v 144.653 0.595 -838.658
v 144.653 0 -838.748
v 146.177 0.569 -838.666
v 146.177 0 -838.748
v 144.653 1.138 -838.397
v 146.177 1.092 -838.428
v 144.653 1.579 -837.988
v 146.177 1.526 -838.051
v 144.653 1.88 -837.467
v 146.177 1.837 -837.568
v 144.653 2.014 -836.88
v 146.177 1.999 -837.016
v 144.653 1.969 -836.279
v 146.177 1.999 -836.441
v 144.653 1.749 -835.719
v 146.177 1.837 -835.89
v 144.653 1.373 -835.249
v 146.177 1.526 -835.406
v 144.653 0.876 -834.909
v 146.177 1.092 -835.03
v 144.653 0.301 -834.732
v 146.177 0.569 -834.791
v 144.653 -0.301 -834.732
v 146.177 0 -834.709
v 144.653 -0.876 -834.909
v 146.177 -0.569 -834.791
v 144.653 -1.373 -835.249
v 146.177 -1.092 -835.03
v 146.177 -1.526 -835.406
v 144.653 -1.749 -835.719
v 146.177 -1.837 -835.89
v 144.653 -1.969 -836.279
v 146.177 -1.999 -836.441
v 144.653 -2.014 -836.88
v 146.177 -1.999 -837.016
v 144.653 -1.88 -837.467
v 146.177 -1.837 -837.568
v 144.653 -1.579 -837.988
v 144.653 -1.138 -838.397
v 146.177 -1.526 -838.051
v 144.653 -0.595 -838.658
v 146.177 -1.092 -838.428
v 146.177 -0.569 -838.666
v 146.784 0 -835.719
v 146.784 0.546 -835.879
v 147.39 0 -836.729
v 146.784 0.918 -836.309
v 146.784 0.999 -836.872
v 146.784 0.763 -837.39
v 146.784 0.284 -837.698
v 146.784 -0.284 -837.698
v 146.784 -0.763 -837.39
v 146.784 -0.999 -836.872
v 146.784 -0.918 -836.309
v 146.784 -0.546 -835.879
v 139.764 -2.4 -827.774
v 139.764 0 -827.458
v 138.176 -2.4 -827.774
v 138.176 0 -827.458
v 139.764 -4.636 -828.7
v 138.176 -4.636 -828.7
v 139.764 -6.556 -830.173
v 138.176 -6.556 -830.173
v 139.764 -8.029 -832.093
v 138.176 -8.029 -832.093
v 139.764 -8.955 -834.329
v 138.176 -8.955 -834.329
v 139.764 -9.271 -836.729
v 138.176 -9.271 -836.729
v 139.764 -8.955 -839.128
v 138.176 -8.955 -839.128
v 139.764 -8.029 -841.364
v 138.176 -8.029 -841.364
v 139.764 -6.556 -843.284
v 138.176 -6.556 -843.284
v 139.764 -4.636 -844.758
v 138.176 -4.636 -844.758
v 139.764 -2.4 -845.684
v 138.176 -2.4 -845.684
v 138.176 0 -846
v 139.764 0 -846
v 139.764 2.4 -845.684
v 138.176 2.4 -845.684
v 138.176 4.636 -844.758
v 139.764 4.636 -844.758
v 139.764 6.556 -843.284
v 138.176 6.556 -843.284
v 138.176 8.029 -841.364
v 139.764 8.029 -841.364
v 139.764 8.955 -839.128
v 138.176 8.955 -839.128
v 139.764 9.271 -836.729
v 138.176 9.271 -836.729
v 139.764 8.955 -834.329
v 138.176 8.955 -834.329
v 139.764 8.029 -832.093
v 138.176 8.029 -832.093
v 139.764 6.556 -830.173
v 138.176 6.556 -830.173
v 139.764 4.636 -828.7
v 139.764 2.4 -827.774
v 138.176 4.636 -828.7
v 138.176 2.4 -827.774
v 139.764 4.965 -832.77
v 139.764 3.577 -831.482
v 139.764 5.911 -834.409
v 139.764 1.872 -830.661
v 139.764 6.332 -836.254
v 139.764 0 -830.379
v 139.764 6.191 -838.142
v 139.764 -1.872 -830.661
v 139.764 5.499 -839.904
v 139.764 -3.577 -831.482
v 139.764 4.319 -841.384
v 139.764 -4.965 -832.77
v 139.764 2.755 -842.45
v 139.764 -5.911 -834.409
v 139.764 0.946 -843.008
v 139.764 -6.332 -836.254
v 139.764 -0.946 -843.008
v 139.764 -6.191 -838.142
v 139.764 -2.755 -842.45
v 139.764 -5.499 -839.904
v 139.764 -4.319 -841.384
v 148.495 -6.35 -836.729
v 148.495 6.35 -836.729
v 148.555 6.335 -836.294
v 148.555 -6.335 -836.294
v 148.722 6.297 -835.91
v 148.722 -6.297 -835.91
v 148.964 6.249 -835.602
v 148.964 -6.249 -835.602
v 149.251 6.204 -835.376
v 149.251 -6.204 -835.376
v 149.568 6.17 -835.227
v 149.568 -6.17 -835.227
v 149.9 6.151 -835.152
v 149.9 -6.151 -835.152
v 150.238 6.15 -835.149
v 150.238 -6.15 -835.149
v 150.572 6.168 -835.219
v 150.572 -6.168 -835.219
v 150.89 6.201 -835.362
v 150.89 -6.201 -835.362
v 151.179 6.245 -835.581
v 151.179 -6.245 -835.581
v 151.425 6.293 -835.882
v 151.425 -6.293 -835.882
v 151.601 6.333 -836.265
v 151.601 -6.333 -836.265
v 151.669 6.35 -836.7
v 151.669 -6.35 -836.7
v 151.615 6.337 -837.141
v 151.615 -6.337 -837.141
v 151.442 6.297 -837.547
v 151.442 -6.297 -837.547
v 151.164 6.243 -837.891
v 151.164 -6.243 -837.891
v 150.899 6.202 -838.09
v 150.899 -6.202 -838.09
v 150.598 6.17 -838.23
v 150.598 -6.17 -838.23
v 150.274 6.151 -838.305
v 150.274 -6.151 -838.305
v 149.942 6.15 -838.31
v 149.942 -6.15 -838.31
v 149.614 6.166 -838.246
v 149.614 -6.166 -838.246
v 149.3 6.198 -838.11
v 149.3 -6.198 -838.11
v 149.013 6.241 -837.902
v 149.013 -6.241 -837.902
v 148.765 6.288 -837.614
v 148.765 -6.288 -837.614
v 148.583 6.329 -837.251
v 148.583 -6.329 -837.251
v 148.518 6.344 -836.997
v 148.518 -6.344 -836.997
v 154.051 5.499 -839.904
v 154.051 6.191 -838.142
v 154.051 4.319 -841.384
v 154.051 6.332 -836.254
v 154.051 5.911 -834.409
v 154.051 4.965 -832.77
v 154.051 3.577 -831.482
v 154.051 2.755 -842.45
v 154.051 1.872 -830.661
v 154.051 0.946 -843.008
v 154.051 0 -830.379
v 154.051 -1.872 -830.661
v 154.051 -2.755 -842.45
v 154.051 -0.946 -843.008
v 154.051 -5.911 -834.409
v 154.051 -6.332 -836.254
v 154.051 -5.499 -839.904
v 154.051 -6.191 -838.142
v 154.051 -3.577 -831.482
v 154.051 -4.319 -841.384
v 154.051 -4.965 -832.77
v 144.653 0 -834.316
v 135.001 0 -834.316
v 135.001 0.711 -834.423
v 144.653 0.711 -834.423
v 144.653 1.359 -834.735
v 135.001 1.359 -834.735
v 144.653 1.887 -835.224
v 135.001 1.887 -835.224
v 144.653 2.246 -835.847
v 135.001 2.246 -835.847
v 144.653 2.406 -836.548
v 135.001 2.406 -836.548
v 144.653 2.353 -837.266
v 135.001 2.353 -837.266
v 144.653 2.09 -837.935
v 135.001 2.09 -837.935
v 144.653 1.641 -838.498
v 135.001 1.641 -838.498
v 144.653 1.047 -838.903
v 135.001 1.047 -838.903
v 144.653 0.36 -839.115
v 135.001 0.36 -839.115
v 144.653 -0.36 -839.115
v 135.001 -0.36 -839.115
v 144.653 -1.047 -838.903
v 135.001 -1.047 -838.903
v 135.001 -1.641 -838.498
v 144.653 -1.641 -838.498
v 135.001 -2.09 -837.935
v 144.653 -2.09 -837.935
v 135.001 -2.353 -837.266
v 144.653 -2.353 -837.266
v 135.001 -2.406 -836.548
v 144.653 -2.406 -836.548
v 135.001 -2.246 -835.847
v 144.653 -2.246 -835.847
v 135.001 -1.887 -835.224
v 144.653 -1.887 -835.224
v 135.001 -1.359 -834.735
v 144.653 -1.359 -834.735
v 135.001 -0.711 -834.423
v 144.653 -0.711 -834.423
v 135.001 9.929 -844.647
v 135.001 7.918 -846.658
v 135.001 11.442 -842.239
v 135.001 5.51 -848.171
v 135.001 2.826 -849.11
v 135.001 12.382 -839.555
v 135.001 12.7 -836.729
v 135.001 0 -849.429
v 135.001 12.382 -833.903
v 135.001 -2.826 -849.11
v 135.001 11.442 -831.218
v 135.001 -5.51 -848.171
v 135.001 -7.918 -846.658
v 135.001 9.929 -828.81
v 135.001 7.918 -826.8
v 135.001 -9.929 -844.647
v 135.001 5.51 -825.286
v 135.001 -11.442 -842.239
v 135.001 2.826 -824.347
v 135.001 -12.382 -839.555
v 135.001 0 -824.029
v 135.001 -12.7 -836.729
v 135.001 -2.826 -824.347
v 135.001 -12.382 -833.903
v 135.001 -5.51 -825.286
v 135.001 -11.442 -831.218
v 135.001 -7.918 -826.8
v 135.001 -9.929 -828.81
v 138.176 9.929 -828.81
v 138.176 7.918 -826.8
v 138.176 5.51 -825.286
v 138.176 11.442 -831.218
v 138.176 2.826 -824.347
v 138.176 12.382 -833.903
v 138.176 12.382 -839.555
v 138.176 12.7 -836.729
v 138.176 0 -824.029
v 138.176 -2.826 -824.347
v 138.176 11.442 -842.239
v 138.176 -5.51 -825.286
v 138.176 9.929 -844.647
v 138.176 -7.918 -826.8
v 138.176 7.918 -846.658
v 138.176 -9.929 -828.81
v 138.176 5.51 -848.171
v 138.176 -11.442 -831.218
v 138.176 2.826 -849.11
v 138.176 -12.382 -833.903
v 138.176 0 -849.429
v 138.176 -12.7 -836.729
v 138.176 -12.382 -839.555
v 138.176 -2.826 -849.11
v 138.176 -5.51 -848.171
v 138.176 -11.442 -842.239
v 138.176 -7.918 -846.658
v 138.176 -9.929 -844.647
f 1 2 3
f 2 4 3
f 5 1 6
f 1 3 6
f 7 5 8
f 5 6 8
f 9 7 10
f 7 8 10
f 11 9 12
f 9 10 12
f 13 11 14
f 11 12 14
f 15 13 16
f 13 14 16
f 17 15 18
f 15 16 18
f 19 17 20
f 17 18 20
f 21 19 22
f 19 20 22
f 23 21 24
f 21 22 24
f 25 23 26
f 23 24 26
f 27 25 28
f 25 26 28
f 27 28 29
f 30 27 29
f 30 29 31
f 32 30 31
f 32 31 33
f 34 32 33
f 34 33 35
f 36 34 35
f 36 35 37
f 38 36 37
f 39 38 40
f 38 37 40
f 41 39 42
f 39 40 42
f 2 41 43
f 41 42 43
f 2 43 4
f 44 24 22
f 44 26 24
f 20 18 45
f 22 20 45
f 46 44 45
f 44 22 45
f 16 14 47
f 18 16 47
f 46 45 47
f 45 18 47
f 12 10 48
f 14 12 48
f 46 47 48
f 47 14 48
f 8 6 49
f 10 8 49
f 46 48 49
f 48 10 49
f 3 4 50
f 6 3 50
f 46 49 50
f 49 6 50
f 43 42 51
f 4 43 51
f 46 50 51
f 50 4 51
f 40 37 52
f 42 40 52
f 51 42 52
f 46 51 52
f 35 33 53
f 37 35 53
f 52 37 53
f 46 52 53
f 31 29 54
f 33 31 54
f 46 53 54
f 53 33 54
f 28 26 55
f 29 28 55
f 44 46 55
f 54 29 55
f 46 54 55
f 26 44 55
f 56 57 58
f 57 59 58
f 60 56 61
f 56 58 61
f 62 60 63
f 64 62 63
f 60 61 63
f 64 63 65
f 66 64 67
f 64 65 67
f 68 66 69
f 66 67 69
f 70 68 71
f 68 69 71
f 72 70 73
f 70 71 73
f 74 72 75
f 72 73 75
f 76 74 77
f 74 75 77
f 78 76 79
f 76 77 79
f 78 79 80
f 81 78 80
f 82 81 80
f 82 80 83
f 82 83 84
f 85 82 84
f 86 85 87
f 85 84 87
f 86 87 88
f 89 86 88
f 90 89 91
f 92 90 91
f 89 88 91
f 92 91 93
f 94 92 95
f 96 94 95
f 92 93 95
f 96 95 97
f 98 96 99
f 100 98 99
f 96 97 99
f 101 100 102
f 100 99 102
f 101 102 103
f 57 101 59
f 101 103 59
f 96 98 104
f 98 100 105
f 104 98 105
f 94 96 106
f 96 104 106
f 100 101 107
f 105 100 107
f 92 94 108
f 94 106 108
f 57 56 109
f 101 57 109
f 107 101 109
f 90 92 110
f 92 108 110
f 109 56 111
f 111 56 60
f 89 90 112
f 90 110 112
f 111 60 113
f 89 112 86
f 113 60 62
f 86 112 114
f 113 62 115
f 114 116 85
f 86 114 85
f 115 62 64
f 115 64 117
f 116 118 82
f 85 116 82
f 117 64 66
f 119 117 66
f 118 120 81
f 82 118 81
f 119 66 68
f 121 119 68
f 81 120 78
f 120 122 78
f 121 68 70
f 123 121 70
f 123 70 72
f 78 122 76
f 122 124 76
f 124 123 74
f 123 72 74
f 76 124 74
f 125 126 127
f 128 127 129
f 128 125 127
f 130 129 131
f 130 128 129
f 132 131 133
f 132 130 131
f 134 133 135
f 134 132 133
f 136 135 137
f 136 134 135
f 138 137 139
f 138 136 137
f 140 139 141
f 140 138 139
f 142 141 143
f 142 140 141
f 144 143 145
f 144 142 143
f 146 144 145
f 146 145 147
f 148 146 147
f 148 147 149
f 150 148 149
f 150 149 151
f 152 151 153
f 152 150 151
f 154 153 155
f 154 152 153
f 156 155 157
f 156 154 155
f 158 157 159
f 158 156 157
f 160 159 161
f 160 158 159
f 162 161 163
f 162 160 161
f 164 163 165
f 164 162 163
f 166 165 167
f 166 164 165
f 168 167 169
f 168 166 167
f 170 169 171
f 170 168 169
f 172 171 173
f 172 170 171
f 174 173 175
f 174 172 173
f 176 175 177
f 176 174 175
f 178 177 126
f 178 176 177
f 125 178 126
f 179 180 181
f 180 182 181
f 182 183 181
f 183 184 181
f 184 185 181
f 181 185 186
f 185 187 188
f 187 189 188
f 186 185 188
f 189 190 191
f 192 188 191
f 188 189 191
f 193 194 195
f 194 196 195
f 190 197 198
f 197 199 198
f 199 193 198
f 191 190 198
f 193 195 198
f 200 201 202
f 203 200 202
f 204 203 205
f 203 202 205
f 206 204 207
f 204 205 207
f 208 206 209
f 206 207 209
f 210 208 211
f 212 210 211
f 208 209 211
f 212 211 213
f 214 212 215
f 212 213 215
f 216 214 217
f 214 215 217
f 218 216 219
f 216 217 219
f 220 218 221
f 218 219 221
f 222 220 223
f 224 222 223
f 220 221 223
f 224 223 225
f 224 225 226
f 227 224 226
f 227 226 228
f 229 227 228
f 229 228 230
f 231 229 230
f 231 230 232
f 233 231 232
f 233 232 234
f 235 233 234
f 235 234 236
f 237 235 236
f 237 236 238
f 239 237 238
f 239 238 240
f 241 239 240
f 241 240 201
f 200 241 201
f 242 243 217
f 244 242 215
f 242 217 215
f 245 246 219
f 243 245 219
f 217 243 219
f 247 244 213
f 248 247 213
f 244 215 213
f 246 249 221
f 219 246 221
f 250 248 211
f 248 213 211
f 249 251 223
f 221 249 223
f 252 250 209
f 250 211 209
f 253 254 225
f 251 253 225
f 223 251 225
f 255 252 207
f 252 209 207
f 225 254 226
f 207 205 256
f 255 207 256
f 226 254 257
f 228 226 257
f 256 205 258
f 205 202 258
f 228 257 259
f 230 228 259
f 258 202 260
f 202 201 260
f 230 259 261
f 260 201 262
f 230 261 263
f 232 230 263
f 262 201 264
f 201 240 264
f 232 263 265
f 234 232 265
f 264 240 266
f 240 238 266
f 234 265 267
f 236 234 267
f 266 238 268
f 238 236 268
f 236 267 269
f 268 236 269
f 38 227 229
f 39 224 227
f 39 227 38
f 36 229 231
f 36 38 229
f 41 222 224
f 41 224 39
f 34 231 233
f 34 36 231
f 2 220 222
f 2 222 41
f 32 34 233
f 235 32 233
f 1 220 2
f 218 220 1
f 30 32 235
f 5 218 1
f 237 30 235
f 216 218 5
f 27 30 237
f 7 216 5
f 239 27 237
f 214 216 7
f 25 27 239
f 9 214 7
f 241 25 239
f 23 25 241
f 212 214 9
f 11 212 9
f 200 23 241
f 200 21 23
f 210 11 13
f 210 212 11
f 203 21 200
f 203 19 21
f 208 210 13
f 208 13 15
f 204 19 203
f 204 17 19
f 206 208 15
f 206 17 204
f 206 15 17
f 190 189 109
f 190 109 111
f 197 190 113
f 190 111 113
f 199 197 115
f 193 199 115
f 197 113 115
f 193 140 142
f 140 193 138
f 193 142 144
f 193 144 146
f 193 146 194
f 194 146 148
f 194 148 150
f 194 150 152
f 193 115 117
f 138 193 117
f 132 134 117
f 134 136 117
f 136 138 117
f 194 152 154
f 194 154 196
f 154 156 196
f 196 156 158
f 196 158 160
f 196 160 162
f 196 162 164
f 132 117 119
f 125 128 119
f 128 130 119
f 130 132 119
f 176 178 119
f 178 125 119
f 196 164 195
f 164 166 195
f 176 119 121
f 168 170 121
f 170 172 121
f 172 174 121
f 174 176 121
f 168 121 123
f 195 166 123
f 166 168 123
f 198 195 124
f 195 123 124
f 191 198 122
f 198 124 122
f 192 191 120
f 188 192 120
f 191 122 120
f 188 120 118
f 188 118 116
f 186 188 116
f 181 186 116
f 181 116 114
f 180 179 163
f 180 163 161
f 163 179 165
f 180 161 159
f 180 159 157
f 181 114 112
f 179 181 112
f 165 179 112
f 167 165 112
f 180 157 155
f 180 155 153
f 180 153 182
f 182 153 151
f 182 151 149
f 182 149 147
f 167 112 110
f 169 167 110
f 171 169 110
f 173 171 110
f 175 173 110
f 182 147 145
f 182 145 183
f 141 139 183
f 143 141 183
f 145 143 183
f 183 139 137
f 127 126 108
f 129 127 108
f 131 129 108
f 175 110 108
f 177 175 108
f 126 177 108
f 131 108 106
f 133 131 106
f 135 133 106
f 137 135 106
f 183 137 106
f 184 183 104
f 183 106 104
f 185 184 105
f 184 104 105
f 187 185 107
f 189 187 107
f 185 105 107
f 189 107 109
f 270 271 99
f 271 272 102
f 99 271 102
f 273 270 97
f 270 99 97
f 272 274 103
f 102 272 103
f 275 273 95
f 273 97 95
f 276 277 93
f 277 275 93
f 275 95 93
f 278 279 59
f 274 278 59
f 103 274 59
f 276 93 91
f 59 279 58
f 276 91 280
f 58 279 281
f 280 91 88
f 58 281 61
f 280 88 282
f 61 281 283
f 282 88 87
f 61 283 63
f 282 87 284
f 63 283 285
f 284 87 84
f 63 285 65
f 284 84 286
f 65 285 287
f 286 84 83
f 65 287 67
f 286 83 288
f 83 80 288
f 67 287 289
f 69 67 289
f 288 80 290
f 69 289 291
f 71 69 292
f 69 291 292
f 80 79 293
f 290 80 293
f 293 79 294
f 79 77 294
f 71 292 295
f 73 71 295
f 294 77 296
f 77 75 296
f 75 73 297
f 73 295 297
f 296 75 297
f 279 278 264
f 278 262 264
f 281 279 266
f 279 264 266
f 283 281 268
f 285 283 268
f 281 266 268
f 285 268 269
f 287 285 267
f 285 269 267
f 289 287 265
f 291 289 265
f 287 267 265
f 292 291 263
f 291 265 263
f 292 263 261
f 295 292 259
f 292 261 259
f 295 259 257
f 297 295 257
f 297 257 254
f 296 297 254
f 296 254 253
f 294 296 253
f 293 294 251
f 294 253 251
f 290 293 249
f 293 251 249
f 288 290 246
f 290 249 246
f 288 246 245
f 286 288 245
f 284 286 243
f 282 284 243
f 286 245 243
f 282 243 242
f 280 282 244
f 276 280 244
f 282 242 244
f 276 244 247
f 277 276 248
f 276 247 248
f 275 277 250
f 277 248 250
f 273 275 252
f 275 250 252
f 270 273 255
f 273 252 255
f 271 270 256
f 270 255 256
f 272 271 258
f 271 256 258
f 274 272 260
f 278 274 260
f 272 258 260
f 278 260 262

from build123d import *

# Parameters (mm, degrees)
F_10_32_TAPPED_HOLE2_D           = 4.0386
F_10_32_TAPPED_HOLE2_DEPTH       = 11.176
F_10_32_TAPPED_HOLE2_CBORE_D     = 4.826
F_10_32_TAPPED_HOLE2_CBORE_DEPTH = 9.652
F_10_32_TAPPED_HOLE2_TIP         = 1.213317848
CUT_EXTRUDE1_DEPTH               = 864.378412287
CUT_EXTRUDE1_DEPTH_BACK          = 864.378412287
SKETCH2_3_R                      = 1.5875


with BuildPart() as part:
    # Sketch2 → Revolve1 (revolve)
    with BuildSketch(Plane(origin=(0, 0, 0), x_dir=(1, 0, 0), z_dir=(0, 1, 0))):
        Polygon((135.001, 849.428797606), (135.001, 836.728797606), (154.051, 836.728797606), (154.051, 843.078797606), (139.7635, 843.078797606), (139.7635, 845.999797606), (138.176, 845.999797606), (138.176, 849.428797606), align=None)
    revolve(axis=Axis((135.001, 0, -836.728797606), (1, 0, 0)))

    # #10-32 Tapped Hole2
    with Locations(Plane.ZY.offset(-135.001)):
        with Locations((-836.728797606, 0)):
            CounterBoreHole(F_10_32_TAPPED_HOLE2_D / 2, F_10_32_TAPPED_HOLE2_CBORE_D / 2, F_10_32_TAPPED_HOLE2_CBORE_DEPTH, depth=F_10_32_TAPPED_HOLE2_DEPTH)
            with Locations((0, 0, -(F_10_32_TAPPED_HOLE2_DEPTH + F_10_32_TAPPED_HOLE2_TIP / 2))):  # 118° drill point
                Cone(0, F_10_32_TAPPED_HOLE2_D / 2, F_10_32_TAPPED_HOLE2_TIP, mode=Mode.SUBTRACT)

    # Sketch2<3> → Cut-Extrude1 (cut, two sides: drawn at the far end of the back side and taken through both)
    with BuildSketch(Plane(origin=(0, 0, 0), x_dir=(1, 0, 0), z_dir=(0, 1, 0)).offset(-CUT_EXTRUDE1_DEPTH_BACK)):
        with Locations((150.08225, 836.728797606)):
            Circle(SKETCH2_3_R)
    extrude(amount=CUT_EXTRUDE1_DEPTH + CUT_EXTRUDE1_DEPTH_BACK, mode=Mode.SUBTRACT)


solid = part.part
